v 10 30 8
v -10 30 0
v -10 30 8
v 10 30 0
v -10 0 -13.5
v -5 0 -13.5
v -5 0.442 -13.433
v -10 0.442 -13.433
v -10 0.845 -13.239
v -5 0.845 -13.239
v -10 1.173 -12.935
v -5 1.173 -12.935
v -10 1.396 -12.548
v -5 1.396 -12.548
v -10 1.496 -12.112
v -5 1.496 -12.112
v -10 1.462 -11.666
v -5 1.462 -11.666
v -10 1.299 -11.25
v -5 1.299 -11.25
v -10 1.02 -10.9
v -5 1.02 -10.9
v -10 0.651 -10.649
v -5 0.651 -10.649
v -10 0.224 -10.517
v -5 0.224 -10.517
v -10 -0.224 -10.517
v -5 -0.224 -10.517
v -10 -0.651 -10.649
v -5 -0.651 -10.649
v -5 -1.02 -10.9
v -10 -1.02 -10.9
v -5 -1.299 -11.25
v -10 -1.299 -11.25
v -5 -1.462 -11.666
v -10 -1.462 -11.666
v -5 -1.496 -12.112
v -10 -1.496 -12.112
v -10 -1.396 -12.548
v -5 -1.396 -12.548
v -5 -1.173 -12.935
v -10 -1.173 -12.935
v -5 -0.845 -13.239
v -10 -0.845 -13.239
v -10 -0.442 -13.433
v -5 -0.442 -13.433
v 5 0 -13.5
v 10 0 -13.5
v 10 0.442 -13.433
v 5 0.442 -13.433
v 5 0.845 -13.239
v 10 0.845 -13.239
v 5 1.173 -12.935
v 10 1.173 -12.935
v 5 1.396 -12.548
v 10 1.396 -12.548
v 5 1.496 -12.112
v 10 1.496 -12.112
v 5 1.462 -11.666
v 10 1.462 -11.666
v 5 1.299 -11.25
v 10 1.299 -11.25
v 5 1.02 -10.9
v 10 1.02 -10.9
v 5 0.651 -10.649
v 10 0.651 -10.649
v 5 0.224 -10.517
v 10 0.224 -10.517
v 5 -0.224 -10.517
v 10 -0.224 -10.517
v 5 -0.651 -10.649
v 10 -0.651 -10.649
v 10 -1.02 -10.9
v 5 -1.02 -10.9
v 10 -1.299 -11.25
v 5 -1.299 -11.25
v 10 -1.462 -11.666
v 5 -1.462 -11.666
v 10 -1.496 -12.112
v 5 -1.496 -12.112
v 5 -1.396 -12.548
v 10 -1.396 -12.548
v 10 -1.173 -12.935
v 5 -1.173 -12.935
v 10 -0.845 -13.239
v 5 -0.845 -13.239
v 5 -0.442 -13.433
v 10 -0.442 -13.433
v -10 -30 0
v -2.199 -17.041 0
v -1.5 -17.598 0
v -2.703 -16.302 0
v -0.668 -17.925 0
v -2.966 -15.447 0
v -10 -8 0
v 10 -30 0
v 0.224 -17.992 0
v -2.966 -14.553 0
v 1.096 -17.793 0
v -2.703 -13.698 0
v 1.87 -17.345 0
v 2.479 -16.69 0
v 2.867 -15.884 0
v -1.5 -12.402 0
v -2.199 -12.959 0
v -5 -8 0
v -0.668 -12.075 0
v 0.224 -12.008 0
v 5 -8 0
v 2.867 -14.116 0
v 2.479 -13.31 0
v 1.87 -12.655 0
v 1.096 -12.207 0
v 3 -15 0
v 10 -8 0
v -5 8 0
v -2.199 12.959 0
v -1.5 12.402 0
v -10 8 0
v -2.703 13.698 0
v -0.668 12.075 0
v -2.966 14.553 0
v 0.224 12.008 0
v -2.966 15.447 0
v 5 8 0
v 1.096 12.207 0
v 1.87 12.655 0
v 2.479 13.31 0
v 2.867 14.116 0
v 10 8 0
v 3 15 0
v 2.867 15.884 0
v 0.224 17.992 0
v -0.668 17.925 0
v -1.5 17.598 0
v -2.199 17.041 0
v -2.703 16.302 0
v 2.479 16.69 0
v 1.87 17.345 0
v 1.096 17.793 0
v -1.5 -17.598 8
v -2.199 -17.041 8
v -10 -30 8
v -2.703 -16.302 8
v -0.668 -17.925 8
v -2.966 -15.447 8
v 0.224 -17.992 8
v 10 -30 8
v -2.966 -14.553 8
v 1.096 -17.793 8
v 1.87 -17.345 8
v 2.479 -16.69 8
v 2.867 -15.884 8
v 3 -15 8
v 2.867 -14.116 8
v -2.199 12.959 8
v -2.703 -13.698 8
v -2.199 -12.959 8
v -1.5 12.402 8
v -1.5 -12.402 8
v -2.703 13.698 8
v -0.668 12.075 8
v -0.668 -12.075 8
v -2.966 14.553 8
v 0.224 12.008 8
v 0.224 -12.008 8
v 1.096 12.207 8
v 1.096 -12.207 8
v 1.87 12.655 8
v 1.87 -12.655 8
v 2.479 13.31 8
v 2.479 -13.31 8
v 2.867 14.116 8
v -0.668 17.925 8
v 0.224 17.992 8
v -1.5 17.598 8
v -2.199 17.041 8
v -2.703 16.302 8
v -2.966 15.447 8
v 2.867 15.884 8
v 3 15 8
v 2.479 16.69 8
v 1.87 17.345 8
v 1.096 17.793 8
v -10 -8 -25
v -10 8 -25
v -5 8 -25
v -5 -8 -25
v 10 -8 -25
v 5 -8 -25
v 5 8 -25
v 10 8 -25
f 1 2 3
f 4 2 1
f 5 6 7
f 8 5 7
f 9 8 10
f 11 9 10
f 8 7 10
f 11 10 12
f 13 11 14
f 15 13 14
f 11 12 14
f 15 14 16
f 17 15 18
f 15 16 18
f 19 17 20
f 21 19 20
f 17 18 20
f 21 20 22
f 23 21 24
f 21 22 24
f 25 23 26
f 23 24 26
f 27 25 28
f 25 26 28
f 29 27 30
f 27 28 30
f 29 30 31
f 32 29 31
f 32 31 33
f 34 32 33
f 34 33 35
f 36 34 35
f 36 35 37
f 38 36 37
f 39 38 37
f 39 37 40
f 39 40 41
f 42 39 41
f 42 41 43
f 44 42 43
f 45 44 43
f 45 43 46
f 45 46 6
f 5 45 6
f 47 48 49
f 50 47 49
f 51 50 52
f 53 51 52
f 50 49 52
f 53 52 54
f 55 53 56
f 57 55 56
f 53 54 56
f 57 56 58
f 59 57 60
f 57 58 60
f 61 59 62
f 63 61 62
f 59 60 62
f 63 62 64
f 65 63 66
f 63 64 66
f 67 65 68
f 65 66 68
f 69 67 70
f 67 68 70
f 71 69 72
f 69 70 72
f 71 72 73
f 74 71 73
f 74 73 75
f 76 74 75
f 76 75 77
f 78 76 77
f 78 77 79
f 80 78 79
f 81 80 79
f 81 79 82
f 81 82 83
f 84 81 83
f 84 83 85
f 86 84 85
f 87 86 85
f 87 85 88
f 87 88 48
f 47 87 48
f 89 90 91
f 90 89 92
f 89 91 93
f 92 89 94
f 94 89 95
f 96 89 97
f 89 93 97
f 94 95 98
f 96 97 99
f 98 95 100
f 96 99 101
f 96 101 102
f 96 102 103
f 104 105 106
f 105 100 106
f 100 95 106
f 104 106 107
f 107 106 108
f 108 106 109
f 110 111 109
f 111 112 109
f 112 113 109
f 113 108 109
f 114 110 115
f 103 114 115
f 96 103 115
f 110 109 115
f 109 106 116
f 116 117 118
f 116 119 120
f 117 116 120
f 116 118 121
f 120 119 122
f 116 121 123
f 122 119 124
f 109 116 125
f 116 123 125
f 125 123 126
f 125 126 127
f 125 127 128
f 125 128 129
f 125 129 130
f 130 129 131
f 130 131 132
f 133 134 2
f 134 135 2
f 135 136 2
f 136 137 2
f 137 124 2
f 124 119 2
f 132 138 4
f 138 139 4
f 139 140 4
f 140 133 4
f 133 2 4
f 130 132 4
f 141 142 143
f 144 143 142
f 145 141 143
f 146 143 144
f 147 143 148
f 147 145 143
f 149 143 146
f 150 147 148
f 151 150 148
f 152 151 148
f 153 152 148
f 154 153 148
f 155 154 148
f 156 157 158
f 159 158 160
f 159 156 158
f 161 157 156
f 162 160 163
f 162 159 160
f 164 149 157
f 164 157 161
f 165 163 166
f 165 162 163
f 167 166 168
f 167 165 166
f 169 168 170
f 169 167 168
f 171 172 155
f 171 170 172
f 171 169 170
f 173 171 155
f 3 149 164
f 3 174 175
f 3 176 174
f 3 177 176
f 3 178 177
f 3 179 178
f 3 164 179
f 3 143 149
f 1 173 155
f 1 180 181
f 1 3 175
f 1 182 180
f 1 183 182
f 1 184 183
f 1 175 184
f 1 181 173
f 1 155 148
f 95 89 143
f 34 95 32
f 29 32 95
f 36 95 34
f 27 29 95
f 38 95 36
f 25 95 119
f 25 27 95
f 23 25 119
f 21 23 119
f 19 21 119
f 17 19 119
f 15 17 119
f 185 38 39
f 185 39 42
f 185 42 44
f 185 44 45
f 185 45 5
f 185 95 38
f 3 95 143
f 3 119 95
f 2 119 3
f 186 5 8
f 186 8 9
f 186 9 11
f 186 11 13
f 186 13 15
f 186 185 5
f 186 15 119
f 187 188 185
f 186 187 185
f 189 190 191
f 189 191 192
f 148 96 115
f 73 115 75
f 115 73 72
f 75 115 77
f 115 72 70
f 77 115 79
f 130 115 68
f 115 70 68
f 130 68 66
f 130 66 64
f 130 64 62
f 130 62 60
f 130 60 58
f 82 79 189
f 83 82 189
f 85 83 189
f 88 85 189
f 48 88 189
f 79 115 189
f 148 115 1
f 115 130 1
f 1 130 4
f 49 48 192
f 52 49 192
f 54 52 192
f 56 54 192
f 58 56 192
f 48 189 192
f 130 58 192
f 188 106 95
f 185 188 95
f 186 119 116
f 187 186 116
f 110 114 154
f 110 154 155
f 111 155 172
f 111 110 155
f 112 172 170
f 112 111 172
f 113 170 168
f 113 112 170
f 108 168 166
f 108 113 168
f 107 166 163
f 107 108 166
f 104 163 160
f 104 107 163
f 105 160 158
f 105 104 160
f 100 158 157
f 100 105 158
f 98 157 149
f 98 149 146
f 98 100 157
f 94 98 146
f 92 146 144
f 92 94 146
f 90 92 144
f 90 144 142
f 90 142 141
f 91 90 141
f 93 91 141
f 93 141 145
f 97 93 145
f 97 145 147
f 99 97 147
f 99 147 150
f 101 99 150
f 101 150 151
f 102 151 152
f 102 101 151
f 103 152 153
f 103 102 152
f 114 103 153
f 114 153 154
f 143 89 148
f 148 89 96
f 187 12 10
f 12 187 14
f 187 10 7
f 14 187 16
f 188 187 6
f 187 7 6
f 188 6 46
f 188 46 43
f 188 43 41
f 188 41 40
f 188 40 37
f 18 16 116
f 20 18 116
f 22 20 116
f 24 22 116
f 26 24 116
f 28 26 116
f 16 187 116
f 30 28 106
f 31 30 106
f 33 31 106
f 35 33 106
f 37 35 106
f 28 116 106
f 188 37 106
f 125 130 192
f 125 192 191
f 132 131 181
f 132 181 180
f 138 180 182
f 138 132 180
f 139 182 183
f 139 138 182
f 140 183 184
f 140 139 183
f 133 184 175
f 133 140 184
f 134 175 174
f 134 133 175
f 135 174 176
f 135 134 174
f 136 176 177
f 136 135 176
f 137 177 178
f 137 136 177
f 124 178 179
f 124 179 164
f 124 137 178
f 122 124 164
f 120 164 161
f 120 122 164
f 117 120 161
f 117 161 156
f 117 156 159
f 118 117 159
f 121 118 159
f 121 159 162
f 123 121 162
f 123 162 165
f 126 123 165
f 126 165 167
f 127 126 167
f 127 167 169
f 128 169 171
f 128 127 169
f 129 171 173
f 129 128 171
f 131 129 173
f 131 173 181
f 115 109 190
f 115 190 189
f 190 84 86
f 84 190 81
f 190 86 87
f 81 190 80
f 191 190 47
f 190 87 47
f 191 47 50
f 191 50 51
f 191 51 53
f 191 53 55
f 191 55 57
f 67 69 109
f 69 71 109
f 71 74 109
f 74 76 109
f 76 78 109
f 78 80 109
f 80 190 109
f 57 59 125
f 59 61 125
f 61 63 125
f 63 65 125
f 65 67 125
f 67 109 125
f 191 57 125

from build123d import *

# Parameters (mm, degrees)
SKETCH_1_W          = 20
SKETCH_1_H          = 60
SKETCH_1_R          = 3
EXTRUDE_1_DEPTH     = 8
EXTRUDE_3_DEPTH     = 25
SKETCH_4_R          = 1.5
CUT_EXTRUDE_1_DEPTH = 25


with BuildPart() as part:
    # 草图1 → 凸台-拉伸1 (new body)
    with BuildSketch(Plane.XY):
        Rectangle(SKETCH_1_W, SKETCH_1_H)
        with Locations((0, 15)):
            Circle(SKETCH_1_R, mode=Mode.SUBTRACT)
        with Locations((0, -15)):
            Circle(SKETCH_1_R, mode=Mode.SUBTRACT)
    extrude(amount=EXTRUDE_1_DEPTH)

    # 草图3 → 凸台-拉伸3 (add)
    with BuildSketch(Plane(origin=(0, 0, 0), x_dir=(-1, 0, 0), z_dir=(0, 0, -1))):
        Polygon((-5, -6), (-5, -8), (-10, -8), (-10, 8), (-5, 8), (-5, 6), align=None)
        Polygon((10, -8), (10, 8), (5, 8), (5, 6), (5, -6), (5, -8), align=None)
    extrude(amount=EXTRUDE_3_DEPTH)

    # 草图4 → 切除-拉伸1 (cut)
    with BuildSketch(Plane(origin=(10, 0, 0), x_dir=(0, 0, -1), z_dir=(1, 0, 0))):
        with Locations((12, 0)):
            Circle(SKETCH_4_R)
    extrude(amount=-CUT_EXTRUDE_1_DEPTH, mode=Mode.SUBTRACT)


solid = part.part
